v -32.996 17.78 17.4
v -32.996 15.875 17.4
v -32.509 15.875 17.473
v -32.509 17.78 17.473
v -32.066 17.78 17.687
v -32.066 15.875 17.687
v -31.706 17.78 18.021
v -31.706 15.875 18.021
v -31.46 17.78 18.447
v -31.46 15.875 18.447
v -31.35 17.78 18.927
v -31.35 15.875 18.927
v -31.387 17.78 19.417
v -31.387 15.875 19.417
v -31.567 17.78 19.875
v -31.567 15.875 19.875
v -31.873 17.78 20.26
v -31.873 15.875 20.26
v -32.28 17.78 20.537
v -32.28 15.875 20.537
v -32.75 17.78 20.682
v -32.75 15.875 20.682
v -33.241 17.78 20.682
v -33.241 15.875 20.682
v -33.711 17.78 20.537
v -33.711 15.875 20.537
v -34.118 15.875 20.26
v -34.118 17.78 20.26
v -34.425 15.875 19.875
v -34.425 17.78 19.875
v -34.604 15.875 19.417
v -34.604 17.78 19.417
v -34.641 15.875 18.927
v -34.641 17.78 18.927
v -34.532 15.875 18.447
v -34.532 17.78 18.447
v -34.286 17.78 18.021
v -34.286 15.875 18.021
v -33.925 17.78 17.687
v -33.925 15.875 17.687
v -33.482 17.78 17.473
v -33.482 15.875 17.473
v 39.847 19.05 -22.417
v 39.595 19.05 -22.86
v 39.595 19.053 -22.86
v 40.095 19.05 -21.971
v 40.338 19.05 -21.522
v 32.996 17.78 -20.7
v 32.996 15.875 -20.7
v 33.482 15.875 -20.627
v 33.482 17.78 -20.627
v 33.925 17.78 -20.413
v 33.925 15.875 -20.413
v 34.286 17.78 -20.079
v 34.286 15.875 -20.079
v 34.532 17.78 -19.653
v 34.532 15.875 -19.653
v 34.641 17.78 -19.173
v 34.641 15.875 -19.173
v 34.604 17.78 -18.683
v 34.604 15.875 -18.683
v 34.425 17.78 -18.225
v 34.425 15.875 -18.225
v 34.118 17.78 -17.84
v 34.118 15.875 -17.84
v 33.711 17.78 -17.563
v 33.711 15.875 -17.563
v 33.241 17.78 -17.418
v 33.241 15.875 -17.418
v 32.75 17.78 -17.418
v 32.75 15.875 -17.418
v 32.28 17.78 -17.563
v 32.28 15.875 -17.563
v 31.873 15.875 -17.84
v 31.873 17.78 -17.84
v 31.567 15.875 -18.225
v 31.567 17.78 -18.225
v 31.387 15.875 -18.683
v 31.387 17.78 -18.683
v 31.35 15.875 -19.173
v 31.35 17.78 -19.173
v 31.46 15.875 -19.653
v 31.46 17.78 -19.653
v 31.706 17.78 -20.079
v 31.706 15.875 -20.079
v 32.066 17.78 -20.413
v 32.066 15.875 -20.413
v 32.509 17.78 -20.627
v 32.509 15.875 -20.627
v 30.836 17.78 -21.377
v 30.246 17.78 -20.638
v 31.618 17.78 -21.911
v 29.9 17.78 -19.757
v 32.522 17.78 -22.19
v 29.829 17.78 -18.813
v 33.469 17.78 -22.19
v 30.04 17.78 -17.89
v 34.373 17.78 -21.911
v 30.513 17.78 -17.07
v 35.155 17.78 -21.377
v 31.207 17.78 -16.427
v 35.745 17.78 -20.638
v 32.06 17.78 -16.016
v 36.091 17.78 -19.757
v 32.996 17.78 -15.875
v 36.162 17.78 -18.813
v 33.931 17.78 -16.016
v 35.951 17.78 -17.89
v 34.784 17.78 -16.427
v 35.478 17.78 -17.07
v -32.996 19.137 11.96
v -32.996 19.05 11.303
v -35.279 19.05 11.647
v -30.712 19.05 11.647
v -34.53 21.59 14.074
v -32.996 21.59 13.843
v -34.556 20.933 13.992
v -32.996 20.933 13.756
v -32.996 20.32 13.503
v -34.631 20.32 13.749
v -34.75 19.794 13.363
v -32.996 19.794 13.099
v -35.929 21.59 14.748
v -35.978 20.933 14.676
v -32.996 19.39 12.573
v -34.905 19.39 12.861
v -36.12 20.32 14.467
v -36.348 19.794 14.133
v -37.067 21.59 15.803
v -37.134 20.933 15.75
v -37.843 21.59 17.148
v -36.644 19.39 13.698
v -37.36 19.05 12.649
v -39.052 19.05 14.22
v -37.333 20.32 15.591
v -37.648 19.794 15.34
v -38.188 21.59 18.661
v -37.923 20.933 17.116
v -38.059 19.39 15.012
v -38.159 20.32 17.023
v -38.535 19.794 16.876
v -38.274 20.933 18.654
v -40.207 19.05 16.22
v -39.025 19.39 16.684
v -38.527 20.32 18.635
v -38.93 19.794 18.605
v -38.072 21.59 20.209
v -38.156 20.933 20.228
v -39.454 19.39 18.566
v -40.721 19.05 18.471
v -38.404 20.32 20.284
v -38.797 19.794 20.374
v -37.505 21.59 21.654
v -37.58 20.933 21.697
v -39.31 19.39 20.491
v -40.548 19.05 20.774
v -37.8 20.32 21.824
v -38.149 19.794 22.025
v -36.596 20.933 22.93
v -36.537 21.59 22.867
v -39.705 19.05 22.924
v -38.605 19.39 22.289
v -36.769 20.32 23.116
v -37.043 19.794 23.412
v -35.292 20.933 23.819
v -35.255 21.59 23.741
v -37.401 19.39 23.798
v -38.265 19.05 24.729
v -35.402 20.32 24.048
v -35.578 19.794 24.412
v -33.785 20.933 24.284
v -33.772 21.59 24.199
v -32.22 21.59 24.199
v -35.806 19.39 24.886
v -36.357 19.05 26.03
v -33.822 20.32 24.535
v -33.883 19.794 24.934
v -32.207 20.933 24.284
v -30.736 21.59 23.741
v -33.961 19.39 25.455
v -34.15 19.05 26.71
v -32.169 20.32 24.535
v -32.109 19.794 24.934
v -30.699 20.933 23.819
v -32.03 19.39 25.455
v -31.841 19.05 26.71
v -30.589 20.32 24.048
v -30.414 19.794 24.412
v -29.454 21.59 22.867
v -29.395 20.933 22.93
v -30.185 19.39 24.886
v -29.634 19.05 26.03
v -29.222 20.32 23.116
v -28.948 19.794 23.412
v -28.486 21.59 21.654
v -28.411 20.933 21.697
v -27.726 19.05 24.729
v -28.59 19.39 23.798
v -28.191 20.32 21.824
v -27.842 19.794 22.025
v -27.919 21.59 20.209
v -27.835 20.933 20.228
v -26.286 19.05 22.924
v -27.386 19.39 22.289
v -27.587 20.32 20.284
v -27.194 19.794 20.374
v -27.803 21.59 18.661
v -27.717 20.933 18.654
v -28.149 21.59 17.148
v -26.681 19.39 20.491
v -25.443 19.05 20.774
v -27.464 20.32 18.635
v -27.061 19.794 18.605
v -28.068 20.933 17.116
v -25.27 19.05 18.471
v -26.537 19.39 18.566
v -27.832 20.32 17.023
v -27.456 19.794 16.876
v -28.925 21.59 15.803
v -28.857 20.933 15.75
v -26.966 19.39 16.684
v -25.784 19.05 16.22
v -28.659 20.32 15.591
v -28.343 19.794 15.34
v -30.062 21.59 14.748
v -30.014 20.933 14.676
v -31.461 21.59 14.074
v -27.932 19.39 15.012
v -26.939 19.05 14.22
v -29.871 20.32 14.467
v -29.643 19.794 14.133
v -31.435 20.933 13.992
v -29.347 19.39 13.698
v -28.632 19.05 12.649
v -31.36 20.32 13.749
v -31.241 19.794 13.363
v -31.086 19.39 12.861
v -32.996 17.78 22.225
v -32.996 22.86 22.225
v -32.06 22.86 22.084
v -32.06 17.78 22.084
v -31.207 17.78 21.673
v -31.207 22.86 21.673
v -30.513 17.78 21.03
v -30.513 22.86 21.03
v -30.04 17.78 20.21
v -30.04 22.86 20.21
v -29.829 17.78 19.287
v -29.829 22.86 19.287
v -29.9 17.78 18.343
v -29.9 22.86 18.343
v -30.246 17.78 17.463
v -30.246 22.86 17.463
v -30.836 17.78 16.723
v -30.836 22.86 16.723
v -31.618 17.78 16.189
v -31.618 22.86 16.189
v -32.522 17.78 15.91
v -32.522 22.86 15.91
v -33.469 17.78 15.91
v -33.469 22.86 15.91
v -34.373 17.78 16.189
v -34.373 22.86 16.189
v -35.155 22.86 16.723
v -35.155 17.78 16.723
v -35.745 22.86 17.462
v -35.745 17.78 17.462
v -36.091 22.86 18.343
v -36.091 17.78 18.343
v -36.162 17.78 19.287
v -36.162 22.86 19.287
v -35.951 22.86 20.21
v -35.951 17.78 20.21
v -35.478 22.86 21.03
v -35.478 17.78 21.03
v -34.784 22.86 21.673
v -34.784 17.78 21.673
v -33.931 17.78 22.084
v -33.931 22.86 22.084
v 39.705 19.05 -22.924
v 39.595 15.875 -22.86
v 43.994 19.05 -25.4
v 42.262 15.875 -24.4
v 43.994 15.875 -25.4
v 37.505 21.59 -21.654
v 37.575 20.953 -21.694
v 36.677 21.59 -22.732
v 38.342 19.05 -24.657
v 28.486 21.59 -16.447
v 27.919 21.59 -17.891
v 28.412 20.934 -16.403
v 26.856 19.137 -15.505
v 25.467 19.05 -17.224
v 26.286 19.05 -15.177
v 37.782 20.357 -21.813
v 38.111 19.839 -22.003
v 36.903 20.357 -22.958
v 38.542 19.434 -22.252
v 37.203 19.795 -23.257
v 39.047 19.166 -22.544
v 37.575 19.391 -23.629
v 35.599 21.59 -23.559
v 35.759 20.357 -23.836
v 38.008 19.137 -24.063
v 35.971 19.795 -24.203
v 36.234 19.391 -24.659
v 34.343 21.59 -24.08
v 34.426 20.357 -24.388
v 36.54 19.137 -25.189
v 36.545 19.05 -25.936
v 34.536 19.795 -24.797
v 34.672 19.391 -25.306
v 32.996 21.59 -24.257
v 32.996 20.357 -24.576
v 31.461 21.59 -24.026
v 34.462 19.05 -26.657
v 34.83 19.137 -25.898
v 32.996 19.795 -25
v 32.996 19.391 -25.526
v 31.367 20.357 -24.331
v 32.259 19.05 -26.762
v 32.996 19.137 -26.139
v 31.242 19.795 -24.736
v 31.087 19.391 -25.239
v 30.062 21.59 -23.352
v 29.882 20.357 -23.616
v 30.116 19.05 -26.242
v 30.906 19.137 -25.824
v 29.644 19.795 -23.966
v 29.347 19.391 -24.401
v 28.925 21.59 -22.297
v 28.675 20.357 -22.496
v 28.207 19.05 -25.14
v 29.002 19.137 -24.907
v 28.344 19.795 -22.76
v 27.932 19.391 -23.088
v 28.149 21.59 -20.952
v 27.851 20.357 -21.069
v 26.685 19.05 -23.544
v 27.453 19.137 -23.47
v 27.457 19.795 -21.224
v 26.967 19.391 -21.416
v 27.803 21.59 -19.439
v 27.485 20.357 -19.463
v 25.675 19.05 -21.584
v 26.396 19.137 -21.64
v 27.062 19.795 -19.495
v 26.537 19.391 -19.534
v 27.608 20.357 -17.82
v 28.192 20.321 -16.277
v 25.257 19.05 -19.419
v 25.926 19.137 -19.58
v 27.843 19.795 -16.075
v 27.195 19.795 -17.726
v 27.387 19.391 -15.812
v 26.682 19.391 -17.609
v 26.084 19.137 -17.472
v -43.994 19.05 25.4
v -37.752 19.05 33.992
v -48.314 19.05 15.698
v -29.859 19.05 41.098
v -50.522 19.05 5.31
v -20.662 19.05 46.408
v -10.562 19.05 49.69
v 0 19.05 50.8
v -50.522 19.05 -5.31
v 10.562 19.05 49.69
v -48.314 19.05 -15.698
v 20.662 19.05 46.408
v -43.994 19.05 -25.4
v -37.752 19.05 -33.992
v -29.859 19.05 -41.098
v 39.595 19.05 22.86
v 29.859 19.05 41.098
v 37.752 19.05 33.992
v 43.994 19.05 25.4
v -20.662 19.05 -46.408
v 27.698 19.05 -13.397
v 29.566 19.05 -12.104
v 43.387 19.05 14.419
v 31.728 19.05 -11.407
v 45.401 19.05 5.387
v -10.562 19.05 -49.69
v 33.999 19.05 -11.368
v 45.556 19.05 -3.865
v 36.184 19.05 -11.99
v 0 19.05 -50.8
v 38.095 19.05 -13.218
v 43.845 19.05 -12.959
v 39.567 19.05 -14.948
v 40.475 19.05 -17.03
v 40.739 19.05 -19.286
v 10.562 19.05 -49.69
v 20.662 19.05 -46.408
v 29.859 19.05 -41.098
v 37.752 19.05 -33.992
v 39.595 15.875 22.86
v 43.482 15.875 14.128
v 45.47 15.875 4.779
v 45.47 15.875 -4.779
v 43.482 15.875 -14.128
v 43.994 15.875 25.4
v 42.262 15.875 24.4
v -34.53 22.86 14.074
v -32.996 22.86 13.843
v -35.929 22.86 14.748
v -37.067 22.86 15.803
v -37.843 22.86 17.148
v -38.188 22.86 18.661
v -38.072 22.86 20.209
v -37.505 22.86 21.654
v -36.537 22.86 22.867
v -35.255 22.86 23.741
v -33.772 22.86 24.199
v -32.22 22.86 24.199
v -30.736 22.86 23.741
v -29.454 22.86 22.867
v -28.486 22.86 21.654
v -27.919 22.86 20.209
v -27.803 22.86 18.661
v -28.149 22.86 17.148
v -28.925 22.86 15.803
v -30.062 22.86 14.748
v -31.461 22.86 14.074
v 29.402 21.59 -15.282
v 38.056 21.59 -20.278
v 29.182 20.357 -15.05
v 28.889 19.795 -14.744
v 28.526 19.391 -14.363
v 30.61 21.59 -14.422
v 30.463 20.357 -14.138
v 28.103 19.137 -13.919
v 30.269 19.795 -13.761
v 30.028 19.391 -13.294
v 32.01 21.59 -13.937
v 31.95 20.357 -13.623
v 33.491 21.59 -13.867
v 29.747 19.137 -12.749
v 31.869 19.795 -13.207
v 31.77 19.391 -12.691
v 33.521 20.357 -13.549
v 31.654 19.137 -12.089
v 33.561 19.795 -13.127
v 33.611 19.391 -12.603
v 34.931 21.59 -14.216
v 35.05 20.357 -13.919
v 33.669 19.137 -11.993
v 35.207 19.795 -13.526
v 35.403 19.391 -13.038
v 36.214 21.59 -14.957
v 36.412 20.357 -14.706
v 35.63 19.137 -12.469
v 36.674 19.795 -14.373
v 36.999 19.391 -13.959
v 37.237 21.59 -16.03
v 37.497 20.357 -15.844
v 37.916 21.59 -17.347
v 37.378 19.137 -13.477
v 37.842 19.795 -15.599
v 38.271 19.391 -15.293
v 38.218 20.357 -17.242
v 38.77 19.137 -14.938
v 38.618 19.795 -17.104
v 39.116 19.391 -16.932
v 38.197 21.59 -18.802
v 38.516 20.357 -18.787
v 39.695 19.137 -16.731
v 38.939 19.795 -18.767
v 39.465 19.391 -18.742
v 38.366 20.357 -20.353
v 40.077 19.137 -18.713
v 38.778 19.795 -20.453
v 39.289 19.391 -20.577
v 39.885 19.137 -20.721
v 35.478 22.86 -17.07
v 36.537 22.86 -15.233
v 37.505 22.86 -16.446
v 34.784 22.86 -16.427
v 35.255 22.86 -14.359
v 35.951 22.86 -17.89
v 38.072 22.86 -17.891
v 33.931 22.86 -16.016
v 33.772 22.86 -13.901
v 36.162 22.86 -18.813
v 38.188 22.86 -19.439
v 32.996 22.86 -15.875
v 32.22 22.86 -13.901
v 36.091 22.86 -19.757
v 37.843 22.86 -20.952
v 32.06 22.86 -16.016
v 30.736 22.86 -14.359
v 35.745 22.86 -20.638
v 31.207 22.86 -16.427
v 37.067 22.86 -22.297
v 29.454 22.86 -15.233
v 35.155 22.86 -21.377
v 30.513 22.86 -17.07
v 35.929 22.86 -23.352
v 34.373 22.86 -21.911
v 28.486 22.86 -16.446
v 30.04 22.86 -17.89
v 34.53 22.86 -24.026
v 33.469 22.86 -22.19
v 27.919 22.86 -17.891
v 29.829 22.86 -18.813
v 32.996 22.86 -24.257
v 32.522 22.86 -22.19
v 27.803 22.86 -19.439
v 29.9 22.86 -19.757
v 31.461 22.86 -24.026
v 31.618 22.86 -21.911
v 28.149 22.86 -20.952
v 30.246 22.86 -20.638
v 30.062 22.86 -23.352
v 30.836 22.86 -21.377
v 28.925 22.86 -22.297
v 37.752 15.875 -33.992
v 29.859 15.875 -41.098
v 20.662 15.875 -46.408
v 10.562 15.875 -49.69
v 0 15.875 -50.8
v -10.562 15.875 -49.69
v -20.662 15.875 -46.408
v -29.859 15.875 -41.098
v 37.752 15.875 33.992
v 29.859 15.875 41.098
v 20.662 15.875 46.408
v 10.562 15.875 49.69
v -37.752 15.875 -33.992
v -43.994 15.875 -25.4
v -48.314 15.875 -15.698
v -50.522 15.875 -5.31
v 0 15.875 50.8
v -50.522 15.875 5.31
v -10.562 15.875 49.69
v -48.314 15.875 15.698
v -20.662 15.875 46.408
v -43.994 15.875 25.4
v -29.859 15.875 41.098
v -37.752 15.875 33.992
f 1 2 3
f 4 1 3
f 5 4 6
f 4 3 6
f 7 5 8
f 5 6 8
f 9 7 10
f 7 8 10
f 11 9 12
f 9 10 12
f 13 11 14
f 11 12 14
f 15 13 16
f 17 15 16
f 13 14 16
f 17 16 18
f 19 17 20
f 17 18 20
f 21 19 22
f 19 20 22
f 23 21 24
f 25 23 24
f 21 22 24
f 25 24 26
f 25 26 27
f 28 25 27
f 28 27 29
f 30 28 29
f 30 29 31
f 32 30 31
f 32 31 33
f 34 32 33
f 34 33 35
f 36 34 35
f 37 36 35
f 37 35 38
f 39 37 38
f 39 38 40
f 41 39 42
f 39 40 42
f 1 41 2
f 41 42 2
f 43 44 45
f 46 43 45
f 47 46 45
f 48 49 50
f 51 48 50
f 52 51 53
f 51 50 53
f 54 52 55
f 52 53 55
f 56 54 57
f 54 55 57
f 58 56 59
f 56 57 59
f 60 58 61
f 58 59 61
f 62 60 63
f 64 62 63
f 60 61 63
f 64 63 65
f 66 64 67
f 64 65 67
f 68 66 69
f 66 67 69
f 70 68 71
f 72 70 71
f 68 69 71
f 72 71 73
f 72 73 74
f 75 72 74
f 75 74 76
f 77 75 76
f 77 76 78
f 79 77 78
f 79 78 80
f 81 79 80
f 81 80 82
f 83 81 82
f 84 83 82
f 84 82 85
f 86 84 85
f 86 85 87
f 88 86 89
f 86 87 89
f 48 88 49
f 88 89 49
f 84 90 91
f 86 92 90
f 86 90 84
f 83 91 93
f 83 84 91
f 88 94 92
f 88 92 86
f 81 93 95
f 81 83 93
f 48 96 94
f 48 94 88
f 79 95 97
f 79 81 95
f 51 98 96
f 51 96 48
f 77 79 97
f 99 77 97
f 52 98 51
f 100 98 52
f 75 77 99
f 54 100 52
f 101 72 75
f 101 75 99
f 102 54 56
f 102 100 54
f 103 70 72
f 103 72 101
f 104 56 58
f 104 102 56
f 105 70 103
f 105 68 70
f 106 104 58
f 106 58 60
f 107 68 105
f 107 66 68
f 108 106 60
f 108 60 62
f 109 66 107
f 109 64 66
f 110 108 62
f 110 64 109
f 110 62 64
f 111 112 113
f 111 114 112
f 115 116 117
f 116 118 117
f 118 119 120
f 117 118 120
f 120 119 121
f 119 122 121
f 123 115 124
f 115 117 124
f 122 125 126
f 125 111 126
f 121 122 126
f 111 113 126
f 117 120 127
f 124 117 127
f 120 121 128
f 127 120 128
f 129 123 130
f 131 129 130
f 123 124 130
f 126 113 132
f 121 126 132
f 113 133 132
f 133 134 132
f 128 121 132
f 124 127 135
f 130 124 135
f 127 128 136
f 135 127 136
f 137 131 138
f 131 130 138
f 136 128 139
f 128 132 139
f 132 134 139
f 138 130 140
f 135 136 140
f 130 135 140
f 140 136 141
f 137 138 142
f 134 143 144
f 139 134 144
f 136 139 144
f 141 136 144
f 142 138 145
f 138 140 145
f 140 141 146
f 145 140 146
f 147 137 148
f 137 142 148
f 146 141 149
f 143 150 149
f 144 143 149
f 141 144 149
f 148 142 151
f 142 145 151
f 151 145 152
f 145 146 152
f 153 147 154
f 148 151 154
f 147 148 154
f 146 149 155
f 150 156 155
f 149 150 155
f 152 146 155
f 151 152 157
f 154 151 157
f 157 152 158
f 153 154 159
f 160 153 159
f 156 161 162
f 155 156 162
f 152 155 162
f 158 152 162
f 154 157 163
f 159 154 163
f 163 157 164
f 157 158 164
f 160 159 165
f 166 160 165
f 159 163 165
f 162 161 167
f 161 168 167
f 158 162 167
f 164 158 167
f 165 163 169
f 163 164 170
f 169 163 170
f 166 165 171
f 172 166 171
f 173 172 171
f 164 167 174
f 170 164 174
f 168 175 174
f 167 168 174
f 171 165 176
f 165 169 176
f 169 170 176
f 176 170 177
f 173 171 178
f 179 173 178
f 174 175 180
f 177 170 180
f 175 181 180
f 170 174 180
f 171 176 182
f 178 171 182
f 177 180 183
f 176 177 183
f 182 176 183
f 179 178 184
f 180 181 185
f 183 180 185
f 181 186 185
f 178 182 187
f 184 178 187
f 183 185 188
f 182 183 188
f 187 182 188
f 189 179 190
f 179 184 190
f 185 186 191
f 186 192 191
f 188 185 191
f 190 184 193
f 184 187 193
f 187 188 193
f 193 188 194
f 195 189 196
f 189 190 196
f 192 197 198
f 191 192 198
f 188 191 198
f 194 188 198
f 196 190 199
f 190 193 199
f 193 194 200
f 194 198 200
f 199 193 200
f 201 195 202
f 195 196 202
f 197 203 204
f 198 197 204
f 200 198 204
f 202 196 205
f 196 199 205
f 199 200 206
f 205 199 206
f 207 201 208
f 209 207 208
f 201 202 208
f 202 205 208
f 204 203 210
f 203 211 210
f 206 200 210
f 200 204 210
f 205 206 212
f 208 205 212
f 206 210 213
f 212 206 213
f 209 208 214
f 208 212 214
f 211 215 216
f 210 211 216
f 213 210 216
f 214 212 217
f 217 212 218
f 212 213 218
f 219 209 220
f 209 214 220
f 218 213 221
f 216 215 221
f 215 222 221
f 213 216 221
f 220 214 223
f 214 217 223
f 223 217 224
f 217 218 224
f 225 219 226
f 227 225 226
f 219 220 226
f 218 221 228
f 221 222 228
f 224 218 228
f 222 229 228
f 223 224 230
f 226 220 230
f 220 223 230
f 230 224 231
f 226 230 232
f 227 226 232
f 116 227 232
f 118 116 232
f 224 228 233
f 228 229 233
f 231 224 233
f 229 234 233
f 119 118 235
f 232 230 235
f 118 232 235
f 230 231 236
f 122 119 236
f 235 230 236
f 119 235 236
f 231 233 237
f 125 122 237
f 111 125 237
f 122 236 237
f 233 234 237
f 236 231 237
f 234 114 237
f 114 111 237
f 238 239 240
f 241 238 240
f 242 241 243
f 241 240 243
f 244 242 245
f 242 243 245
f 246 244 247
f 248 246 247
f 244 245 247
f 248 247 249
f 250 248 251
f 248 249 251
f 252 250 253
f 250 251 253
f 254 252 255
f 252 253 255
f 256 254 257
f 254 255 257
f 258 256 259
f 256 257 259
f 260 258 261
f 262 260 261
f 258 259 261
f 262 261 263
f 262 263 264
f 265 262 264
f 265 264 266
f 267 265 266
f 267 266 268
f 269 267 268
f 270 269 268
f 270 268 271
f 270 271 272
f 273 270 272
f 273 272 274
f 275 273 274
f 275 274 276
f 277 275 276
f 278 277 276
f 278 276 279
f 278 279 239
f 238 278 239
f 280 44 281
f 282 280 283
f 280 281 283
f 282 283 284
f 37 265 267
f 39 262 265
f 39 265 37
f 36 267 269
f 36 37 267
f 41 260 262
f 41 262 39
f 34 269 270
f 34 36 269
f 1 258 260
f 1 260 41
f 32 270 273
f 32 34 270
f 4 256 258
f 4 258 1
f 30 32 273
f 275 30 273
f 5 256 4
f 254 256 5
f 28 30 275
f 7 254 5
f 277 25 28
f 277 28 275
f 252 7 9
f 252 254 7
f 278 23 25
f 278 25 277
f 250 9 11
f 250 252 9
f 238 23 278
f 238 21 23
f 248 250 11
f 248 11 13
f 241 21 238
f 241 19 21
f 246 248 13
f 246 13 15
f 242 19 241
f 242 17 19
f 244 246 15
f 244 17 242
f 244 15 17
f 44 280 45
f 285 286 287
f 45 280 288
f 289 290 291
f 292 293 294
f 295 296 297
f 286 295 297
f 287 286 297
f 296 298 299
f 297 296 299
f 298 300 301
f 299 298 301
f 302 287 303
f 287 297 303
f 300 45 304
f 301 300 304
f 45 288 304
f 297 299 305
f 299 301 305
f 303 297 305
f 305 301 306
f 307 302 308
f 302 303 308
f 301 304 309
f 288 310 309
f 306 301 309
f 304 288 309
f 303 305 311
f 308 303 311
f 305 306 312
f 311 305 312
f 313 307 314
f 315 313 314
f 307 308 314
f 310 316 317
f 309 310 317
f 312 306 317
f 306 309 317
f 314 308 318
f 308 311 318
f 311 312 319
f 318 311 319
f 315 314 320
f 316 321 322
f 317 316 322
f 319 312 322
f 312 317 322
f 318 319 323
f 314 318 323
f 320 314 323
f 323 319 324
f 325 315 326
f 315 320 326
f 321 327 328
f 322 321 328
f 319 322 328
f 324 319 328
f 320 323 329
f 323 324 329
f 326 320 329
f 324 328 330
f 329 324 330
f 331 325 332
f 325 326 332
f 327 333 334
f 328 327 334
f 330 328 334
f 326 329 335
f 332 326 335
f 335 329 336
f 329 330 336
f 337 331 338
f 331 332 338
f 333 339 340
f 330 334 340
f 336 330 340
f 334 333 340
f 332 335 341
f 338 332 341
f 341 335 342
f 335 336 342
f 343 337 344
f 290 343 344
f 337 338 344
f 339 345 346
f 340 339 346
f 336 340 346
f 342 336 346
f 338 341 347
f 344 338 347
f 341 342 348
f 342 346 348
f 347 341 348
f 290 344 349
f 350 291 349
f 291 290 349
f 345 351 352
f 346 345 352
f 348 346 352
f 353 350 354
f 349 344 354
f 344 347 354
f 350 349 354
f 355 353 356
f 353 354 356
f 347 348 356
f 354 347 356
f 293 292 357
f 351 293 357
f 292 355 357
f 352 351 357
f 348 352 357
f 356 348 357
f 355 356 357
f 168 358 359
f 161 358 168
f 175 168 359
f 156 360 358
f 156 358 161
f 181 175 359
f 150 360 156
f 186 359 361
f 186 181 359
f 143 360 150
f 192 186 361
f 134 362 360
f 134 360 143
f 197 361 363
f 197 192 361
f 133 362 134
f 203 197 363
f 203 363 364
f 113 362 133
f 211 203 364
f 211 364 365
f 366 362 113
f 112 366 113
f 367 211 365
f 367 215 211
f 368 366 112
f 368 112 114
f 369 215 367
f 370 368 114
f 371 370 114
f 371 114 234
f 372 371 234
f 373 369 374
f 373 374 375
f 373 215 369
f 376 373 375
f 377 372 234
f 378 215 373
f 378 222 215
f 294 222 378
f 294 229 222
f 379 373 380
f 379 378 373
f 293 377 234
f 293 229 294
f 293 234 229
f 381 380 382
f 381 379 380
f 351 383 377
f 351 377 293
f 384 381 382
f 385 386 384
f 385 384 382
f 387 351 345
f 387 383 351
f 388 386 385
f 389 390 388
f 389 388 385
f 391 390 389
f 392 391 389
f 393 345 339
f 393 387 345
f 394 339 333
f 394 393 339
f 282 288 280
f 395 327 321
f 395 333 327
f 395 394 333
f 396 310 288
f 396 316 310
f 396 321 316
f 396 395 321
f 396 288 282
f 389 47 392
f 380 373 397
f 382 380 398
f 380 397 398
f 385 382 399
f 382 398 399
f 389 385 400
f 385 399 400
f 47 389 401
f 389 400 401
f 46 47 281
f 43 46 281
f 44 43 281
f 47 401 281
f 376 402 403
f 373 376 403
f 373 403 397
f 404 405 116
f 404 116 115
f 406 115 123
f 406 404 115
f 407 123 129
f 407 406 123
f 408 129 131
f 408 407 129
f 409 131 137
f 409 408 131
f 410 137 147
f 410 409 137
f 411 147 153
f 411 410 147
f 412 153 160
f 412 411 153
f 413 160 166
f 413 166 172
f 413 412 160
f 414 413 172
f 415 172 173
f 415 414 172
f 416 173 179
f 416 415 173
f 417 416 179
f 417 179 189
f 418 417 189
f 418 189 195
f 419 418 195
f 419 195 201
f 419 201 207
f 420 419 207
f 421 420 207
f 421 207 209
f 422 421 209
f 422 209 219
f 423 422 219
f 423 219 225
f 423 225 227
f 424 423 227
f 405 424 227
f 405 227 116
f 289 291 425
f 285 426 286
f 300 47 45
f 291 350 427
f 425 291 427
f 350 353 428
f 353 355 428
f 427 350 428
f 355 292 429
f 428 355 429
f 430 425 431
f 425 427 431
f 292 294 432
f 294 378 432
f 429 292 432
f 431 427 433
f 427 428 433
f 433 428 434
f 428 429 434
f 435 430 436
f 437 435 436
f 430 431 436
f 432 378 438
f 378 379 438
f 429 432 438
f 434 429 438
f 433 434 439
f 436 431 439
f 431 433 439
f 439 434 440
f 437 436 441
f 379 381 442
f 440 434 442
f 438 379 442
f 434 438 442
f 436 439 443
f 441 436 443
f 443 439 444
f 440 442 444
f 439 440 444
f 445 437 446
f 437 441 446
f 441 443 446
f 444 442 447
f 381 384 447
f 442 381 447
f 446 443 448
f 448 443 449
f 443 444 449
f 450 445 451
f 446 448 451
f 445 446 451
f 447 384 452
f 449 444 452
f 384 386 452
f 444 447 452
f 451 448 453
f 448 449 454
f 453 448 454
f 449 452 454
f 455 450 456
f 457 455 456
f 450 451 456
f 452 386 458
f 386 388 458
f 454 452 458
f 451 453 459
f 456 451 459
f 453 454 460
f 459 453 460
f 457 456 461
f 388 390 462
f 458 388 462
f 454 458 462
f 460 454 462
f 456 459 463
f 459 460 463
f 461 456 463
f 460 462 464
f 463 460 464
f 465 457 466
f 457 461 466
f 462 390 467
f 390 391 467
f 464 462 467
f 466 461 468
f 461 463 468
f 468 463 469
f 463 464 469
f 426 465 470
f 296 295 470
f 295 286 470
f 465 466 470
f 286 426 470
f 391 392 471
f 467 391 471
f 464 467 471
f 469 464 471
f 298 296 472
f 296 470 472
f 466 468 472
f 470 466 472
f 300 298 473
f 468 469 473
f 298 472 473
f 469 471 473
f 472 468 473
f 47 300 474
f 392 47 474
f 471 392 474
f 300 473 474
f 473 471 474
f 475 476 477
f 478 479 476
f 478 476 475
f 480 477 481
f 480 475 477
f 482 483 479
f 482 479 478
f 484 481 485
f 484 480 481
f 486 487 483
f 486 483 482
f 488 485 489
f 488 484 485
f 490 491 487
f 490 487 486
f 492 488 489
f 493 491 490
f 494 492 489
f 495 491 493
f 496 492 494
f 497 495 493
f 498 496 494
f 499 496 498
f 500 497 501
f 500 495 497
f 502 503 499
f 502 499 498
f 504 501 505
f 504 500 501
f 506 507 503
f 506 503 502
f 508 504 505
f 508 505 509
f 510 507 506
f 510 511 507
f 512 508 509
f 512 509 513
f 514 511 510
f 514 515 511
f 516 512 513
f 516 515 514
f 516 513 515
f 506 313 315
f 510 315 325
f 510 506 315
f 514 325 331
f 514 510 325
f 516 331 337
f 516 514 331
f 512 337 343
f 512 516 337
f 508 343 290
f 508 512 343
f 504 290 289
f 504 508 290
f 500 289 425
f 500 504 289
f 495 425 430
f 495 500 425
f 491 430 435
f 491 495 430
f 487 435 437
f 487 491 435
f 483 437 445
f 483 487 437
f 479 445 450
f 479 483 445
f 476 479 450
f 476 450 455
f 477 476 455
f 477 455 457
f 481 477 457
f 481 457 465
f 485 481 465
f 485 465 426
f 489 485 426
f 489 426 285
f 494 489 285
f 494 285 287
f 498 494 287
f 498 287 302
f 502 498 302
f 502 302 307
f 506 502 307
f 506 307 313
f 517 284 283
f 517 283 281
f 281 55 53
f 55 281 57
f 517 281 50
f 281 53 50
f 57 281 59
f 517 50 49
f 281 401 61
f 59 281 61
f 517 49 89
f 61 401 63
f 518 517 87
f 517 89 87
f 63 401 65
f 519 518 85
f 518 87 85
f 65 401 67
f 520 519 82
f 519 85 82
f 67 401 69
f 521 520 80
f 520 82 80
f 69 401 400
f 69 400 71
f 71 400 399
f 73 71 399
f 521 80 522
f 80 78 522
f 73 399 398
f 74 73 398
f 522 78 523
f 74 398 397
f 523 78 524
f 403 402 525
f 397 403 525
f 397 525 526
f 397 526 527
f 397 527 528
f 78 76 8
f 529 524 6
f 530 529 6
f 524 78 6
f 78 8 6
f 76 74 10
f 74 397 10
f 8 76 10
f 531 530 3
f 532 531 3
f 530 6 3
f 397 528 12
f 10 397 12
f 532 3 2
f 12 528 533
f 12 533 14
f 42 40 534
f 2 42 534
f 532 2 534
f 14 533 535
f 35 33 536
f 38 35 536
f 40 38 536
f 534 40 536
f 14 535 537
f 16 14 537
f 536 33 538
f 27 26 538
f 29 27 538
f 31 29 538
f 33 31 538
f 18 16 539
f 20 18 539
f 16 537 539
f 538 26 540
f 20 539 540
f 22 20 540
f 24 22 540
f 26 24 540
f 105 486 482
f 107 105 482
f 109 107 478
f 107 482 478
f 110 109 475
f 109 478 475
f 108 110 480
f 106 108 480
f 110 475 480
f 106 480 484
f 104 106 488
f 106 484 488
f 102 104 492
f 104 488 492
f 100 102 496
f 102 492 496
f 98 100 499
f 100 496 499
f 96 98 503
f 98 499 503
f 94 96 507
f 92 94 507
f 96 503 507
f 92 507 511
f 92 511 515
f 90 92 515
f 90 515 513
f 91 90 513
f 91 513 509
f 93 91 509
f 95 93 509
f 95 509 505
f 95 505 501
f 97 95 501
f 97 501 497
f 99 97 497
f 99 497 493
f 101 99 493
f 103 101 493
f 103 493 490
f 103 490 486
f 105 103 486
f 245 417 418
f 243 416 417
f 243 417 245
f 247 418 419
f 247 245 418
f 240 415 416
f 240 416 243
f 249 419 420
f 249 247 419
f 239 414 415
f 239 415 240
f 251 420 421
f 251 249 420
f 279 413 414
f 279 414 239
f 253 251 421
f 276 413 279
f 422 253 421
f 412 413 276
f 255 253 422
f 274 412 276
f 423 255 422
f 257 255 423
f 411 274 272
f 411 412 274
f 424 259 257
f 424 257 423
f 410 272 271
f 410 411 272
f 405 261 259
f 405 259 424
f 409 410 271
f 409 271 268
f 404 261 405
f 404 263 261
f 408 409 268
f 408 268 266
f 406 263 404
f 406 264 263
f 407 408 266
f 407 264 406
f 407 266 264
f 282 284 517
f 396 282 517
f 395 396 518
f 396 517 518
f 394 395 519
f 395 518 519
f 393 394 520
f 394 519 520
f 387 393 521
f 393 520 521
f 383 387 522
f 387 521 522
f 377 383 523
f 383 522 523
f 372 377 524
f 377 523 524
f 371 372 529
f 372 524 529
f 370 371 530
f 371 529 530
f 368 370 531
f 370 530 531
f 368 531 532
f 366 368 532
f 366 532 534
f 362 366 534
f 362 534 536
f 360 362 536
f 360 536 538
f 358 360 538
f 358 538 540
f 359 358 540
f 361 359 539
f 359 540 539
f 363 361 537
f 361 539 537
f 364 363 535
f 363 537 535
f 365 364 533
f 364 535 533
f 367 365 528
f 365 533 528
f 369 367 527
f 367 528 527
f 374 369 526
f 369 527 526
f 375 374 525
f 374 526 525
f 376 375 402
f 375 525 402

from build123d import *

# Parameters (mm, degrees)
SKETCH1_R            = 50.8
SKETCH1_R_2          = 48.8
SKETCH1_R_3          = 1.905
BOSS_EXTRUDE1_DEPTH  = 3.175
SKETCH3_R            = 50.8
SKETCH3_R_2          = 48.8
BOSS_EXTRUDE3_DEPTH  = 12.7
CUT_EXTRUDE1_DEPTH   = 73.955945611
FILLET2_R            = 6.35
SKETCH5_R            = 1.905
SKETCH5_W            = 16.479
SKETCH5_H            = 6
BOSS_EXTRUDE4_DEPTH  = 1
CUT_EXTRUDE2_DEPTH   = 74.575102096
BOSS_EXTRUDE5_DEPTH  = 12.7
SKETCH10_R           = 1.5
CUT_EXTRUDE4_DEPTH   = 73.95594575
BOSS_EXTRUDE7_START  = 12.7
SKETCH11_R           = 4.04
SKETCH11_R_2         = 1.5
BOSS_EXTRUDE7_DEPTH  = 12.7
BOSS_EXTRUDE8_START  = 38.1
BOSS_EXTRUDE8_DEPTH  = 38.1
FILLET4_R            = 3.175
BOSS_EXTRUDE9_DEPTH  = 15.24
SKETCH14_R           = 1.5
BOSS_EXTRUDE10_DEPTH = 3.175
CUT_EXTRUDE5_DEPTH   = 69.215
SKETCH16_R           = 3.175
CUT_EXTRUDE6_DEPTH   = 1.27
BOSS_EXTRUDE11_START = 3.81
SKETCH17_R           = 5.207
SKETCH17_R_2         = 3.175
BOSS_EXTRUDE11_DEPTH = 3.81
FILLET5_R            = 2.54
SKETCH18_R           = 1.65
CUT_EXTRUDE7_DEPTH   = 1.905


with BuildPart() as part:
    # Sketch1 → Boss-Extrude1 (new body)
    # profile 1 of 2: a face of its own
    with BuildSketch(Plane(origin=(0, 0, 0), x_dir=(1, 0, 0), z_dir=(0, 1, 0))):
        with Locations(Location((0, 0, 0), (0, 0, 270))):
            Circle(SKETCH1_R)
        Circle(SKETCH1_R_2, mode=Mode.SUBTRACT)
    # profile 2 of 2: a face of its own
    with BuildSketch(Plane(origin=(0, 0, 0), x_dir=(1, 0, 0), z_dir=(0, 1, 0))):
        Circle(SKETCH1_R_2)
        with Locations(Location((-13.1445, 33.02, 0), (0, 0, 270))):
            Circle(SKETCH1_R_3, mode=Mode.SUBTRACT)
        with Locations(Location((13.1445, 33.02, 0), (0, 0, 270))):
            Circle(SKETCH1_R_3, mode=Mode.SUBTRACT)
    extrude(amount=BOSS_EXTRUDE1_DEPTH)

    # Sketch3 → Boss-Extrude3 (add)
    with BuildSketch(Plane(origin=(0, 3.175, 0), x_dir=(1, 0, 0), z_dir=(0, 1, 0))):
        with Locations(Location((0, 0, 0), (0, 0, 270))):
            Circle(SKETCH3_R)
        with Locations(Location((0, 0, 0), (0, 0, 90))):
            Circle(SKETCH3_R_2, mode=Mode.SUBTRACT)
    extrude(amount=BOSS_EXTRUDE3_DEPTH)

    # Sketch4 → Cut-Extrude1 (cut, through all)
    with BuildSketch(Plane(origin=(0, 3.175, 0), x_dir=(1, 0, 0), z_dir=(0, 1, 0))):
        with BuildLine():
            Line((25.4, -38.01523905), (25.4, -20.834346642))
            add(Edge.make_bspline(
                [(-25.4, -20.834346642), (0, -32.254229315), (25.4, -20.834346642)],
                knots=[0, 0, 0, 1, 1, 1], degree=2))
            Line((-25.4, -20.834346642), (-25.4, -38.01523905))
            ThreePointArc((-25.4, -38.01523905), (0, -45.72), (25.4, -38.01523905))
        make_face()
    extrude(amount=-CUT_EXTRUDE1_DEPTH, mode=Mode.SUBTRACT)

    # Fillet2
    fillet2_edges = [part.edges().sort_by_distance(p)[0] for p in [
        (25.4, 1.5875, 20.834346642),
        (-25.4, 1.5875, 20.834346642),
        (-25.4, 1.5875, 38.01523905),
        (25.4, 1.5875, 38.01523905),
    ]]
    fillet(fillet2_edges, radius=FILLET2_R)

    # Sketch5 → Boss-Extrude4 (add)
    # profile 1 of 8: a face of its own
    with BuildSketch(Plane(origin=(0, 3.175, 0), x_dir=(1, 0, 0), z_dir=(0, 1, 0))):
        with BuildLine():
            Line((13.1445, 37.925), (-13.1445, 37.925))
            ThreePointArc((-13.1445, 37.925), (-9.676141238, 36.488358762), (-8.2395, 33.02))
            Line((-8.2395, 33.02), (-8.2395, 28.115))
            Line((-8.2395, 28.115), (8.2395, 28.115))
            Line((8.2395, 28.115), (8.2395, 33.02))
            ThreePointArc((8.2395, 33.02), (9.676141238, 36.488358762), (13.1445, 37.925))
        make_face()
    # profile 2 of 8: a face of its own
    with BuildSketch(Plane(origin=(0, 3.175, 0), x_dir=(1, 0, 0), z_dir=(0, 1, 0))):
        with BuildLine():
            ThreePointArc((-8.2395, 33.02), (-9.676141238, 36.488358762), (-13.1445, 37.925))
            ThreePointArc((-13.1445, 37.925), (-16.612858762, 36.488358762), (-18.0495, 33.02))
            ThreePointArc((-18.0495, 33.02), (-16.612858762, 29.551641238), (-13.1445, 28.115))
            ThreePointArc((-13.1445, 28.115), (-9.676141238, 29.551641238), (-8.2395, 33.02))
        make_face()
        with Locations(Location((-13.1445, 33.02, 0), (0, 0, 270))):
            Circle(SKETCH5_R, mode=Mode.SUBTRACT)
    # profile 3 of 8: a face of its own
    with BuildSketch(Plane(origin=(0, 3.175, 0), x_dir=(1, 0, 0), z_dir=(0, 1, 0))):
        with BuildLine():
            ThreePointArc((18.0495, 33.02), (16.612858762, 36.488358762), (13.1445, 37.925))
            ThreePointArc((13.1445, 37.925), (9.676141238, 36.488358762), (8.2395, 33.02))
            ThreePointArc((8.2395, 33.02), (9.676141238, 29.551641238), (13.1445, 28.115))
            ThreePointArc((13.1445, 28.115), (16.612858762, 29.551641238), (18.0495, 33.02))
        make_face()
        with Locations(Location((13.1445, 33.02, 0), (0, 0, 270))):
            Circle(SKETCH5_R, mode=Mode.SUBTRACT)
    # profile 4 of 8: a face of its own
    with BuildSketch(Plane(origin=(0, 3.175, 0), x_dir=(1, 0, 0), z_dir=(0, 1, 0))):
        with BuildLine():
            Line((-8.2395, 28.115), (-8.2395, 33.02))
            ThreePointArc((-8.2395, 33.02), (-9.676141238, 29.551641238), (-13.1445, 28.115))
            Line((-13.1445, 28.115), (-8.2395, 28.115))
        make_face()
    # profile 5 of 8: a face of its own
    with BuildSketch(Plane(origin=(0, 3.175, 0), x_dir=(1, 0, 0), z_dir=(0, 1, 0))):
        with BuildLine():
            ThreePointArc((-13.1445, 28.115), (-16.612858762, 29.551641238), (-18.0495, 33.02))
            Line((-18.0495, 33.02), (-18.0495, -23.729829016))
            add(Edge.make_bspline(
                [(-17.200482213, -23.925830908), (-17.339134534, -23.883616376), (-17.479112922, -23.845147844), (-17.620279441, -23.81048615), (-17.762494237, -23.779683986), (-17.905615595, -23.752786017), (-18.049499996, -23.729828993)],
                knots=[0, 0, 0, 0, 0, 0, 0, 0.074218898, 0.074218898, 0.074218898, 0.074218898, 0.074218898, 0.074218898, 0.074218898], degree=6))
            add(Edge.make_bspline(
                [(-17.200482213, -23.925830908), (-12.719991107, -25.289975642), (-8.2395, -25.943438167)],
                knots=[0.16140783, 0.16140783, 0.16140783, 0.337805118, 0.337805118, 0.337805118], degree=2))
            Line((-8.2395, -25.943438167), (-8.2395, -2.461719083))
            Line((-8.2395, -2.461719083), (-8.2395, 3.538280917))
            Line((-8.2395, 3.538280917), (-8.2395, 28.115))
            Line((-8.2395, 28.115), (-13.1445, 28.115))
        make_face()
    # profile 6 of 8: a face of its own
    with BuildSketch(Plane(origin=(0, 3.175, 0), x_dir=(1, 0, 0), z_dir=(0, 1, 0))):
        with BuildLine():
            Line((18.0495, -23.729829016), (18.0495, 33.02))
            ThreePointArc((18.0495, 33.02), (16.612858762, 29.551641238), (13.1445, 28.115))
            Line((13.1445, 28.115), (8.2395, 28.115))
            Line((8.2395, 28.115), (8.2395, 3.538280917))
            Line((8.2395, 3.538280917), (8.2395, -2.461719083))
            Line((8.2395, -2.461719083), (8.2395, -25.943438167))
            add(Edge.make_bspline(
                [(8.2395, -25.943438167), (12.719991107, -25.289975642), (17.200482213, -23.925830908)],
                knots=[0.662194882, 0.662194882, 0.662194882, 0.83859217, 0.83859217, 0.83859217], degree=2))
            add(Edge.make_bspline(
                [(18.049499996, -23.729828993), (17.905615595, -23.752786017), (17.762494237, -23.779683986), (17.620279441, -23.81048615), (17.479112922, -23.845147844), (17.339134534, -23.883616376), (17.200482213, -23.925830908)],
                knots=[0.925781102, 0.925781102, 0.925781102, 0.925781102, 0.925781102, 0.925781102, 0.925781102, 1, 1, 1, 1, 1, 1, 1], degree=6))
        make_face()
    # profile 7 of 8: a face of its own
    with BuildSketch(Plane(origin=(0, 3.175, 0), x_dir=(1, 0, 0), z_dir=(0, 1, 0))):
        with BuildLine():
            ThreePointArc((13.1445, 28.115), (9.676141238, 29.551641238), (8.2395, 33.02))
            Line((8.2395, 33.02), (8.2395, 28.115))
            Line((8.2395, 28.115), (13.1445, 28.115))
        make_face()
    # profile 8 of 8: a face of its own
    with BuildSketch(Plane(origin=(0, 3.175, 0), x_dir=(1, 0, 0), z_dir=(0, 1, 0))):
        with Locations((0, 0.538280917)):
            Rectangle(SKETCH5_W, SKETCH5_H)
    extrude(amount=BOSS_EXTRUDE4_DEPTH)

    # Sketch6 → Cut-Extrude2 (cut, through all)
    with BuildSketch(Plane(origin=(0, 15.875, 0), x_dir=(1, 0, 0), z_dir=(0, 1, 0))):
        with BuildLine():
            Line((42.262039705, 24.4), (39.594681461, 22.86))
            ThreePointArc((39.594681461, 22.86), (44.162128778, 11.833206742), (45.72, 0))
            Line((45.72, 0), (48.8, 0))
            ThreePointArc((48.8, 0), (47.137180323, 12.630369401), (42.262039705, 24.4))
        make_face()
        with BuildLine():
            ThreePointArc((45.72, 0), (44.162128778, -11.833206742), (39.594681461, -22.86))
            Line((39.594681461, -22.86), (42.262039705, -24.4))
            ThreePointArc((42.262039705, -24.4), (47.137180323, -12.630369401), (48.8, 0))
            Line((48.8, 0), (45.72, 0))
        make_face()
        with BuildLine():
            ThreePointArc((48.8, 0), (47.137180323, -12.630369401), (42.262039705, -24.4))
            Line((42.262039705, -24.4), (43.994090512, -25.4))
            ThreePointArc((43.994090512, -25.4), (49.069031975, -13.148007491), (50.8, 0))
            Line((50.8, 0), (48.8, 0))
        make_face()
        with BuildLine():
            Line((43.994090512, 25.4), (42.262039705, 24.4))
            ThreePointArc((42.262039705, 24.4), (47.137180323, 12.630369401), (48.8, 0))
            Line((48.8, 0), (50.8, 0))
            ThreePointArc((50.8, 0), (49.069031975, 13.148007491), (43.994090512, 25.4))
        make_face()
    extrude(amount=-CUT_EXTRUDE2_DEPTH, mode=Mode.SUBTRACT)

    # Sketch7 → Boss-Extrude5 (add)
    with BuildSketch(Plane(origin=(0, 3.175, 0), x_dir=(1, 0, 0), z_dir=(0, 1, 0))):
        with BuildLine():
            Line((42.262039705, -24.4), (39.594681461, -22.86))
            ThreePointArc((39.594681461, -22.86), (45.72, 0), (39.594681461, 22.86))
            Line((39.594681461, 22.86), (42.262039705, 24.4))
            ThreePointArc((42.262039705, 24.4), (41.753056776, 25.261081723), (41.226531944, 26.111550392))
            Line((41.226531944, 26.111550392), (36.822993007, 23.569166002))
            ThreePointArc((36.822993007, 23.569166002), (43.72, 0), (36.822993007, -23.569166002))
            Line((36.822993007, -23.569166002), (41.226531944, -26.111550392))
            ThreePointArc((41.226531944, -26.111550392), (41.753056776, -25.261081723), (42.262039705, -24.4))
        make_face()
    extrude(amount=BOSS_EXTRUDE5_DEPTH)

    # Sketch10 → Cut-Extrude4 (cut, through all)
    with BuildSketch(Plane(origin=(0, 3.175, 0), x_dir=(1, 0, 0), z_dir=(0, 1, 0))):
        with Locations(Location((-32.995567884, -19.05, 0), (0, 0, 270))):
            Circle(SKETCH10_R)
        with Locations(Location((32.995567884, 19.05, 0), (0, 0, 270))):
            Circle(SKETCH10_R)
    extrude(amount=-CUT_EXTRUDE4_DEPTH, mode=Mode.SUBTRACT)

    # Sketch11 → Boss-Extrude7 (add)
    # profile 1 of 3: a face of its own
    with BuildSketch(Plane(origin=(0, 3.175, 0), x_dir=(1, 0, 0), z_dir=(0, 1, 0)).offset(BOSS_EXTRUDE7_START)):
        with BuildLine():
            Line((37.125332322, 23.09), (32.995567884, 23.09))
            ThreePointArc((32.995567884, 23.09), (35.85227928, 21.906711396), (37.035567884, 19.05))
            ThreePointArc((37.035567884, 19.05), (35.85227928, 16.193288604), (32.995567884, 15.01))
            Line((32.995567884, 15.01), (41.062614383, 15.01))
            ThreePointArc((41.062614383, 15.01), (39.302167275, 19.151450272), (37.125332322, 23.09))
        make_face()
    # profile 2 of 3: a face of its own
    with BuildSketch(Plane(origin=(0, 3.175, 0), x_dir=(1, 0, 0), z_dir=(0, 1, 0)).offset(BOSS_EXTRUDE7_START)):
        with Locations((32.995567884, 19.05)):
            Circle(SKETCH11_R)
        with Locations(Location((32.995567884, 19.05, 0), (0, 0, 270))):
            Circle(SKETCH11_R_2, mode=Mode.SUBTRACT)
    # profile 3 of 3: a face of its own
    with BuildSketch(Plane(origin=(0, 3.175, 0), x_dir=(1, 0, 0), z_dir=(0, 1, 0)).offset(BOSS_EXTRUDE7_START)):
        with Locations(Location((-32.995567884, -19.05, 0), (0, 0, 270))):
            Circle(SKETCH11_R)
        with Locations(Location((-32.995567884, -19.05, 0), (0, 0, 270))):
            Circle(SKETCH11_R_2, mode=Mode.SUBTRACT)
    extrude(amount=-BOSS_EXTRUDE7_DEPTH)

    # Sketch12 → Boss-Extrude8 (add)
    with BuildSketch(Plane.XZ.offset(BOSS_EXTRUDE8_START)):
        with BuildLine():
            ThreePointArc((28.584071469, 41.995128982), (29.185832393, 29.185832393), (41.995128982, 28.584071469))
            ThreePointArc((41.995128982, 28.584071469), (35.921024484, 35.921024484), (28.584071469, 41.995128982))
        make_face()
        with BuildLine():
            ThreePointArc((28.584071469, -41.995128982), (35.921024484, -35.921024484), (41.995128982, -28.584071469))
            ThreePointArc((41.995128982, -28.584071469), (29.185832393, -29.185832393), (28.584071469, -41.995128982))
        make_face()
        with BuildLine():
            ThreePointArc((-41.995128982, 28.584071469), (-29.185832393, 29.185832393), (-28.584071469, 41.995128982))
            ThreePointArc((-28.584071469, 41.995128982), (-35.921024484, 35.921024484), (-41.995128982, 28.584071469))
        make_face()
        with BuildLine():
            ThreePointArc((-41.995128982, -28.584071469), (-35.921024484, -35.921024484), (-28.584071469, -41.995128982))
            ThreePointArc((-28.584071469, -41.995128982), (-29.185832393, -29.185832393), (-41.995128982, -28.584071469))
        make_face()
    extrude(amount=-BOSS_EXTRUDE8_DEPTH)

    # Fillet4
    fillet4_edges = [part.edges().sort_by_distance(p)[0] for p in [
        (41.995128982, -19.05, 28.584071469),
        (28.584071469, -19.05, 41.995128982),
        (28.584071469, -19.05, -41.995128982),
        (41.995128982, -19.05, -28.584071469),
        (-28.584071469, -19.05, 41.995128982),
        (-41.995128982, -19.05, 28.584071469),
        (-41.995128982, -19.05, -28.584071469),
        (-28.584071469, -19.05, -41.995128982),
    ]]
    fillet(fillet4_edges, radius=FILLET4_R)

    # Sketch13 → Boss-Extrude9 (add)
    with BuildSketch(Plane.XZ.offset(38.1)):
        Polygon((35.022998872, 35.022998872), (30.532870812, 39.513126933), (26.940768363, 35.921024484), (35.921024484, 26.940768363), (39.513126933, 30.532870812), align=None)
        Polygon((26.741716429, -35.72197255), (35.72197255, -26.741716429), (39.314074999, -30.333818878), (34.823946938, -34.823946938), (30.333818878, -39.314074999), align=None)
        Polygon((-35.921024484, -26.542664495), (-26.940768363, -35.522920616), (-30.532870812, -39.115023065), (-35.022998872, -34.624895004), (-39.513126933, -30.134766943), align=None)
        Polygon((-26.741716429, 36.120076418), (-35.72197255, 27.139820297), (-39.314074999, 30.731922746), (-34.823946938, 35.222050806), (-30.333818878, 39.712178867), align=None)
    extrude(amount=BOSS_EXTRUDE9_DEPTH)

    # Sketch14 → Boss-Extrude10 (add)
    # profile 1 of 2: a face of its own
    with BuildSketch(Plane(origin=(0, 15.875, 0), x_dir=(1, 0, 0), z_dir=(0, 1, 0))):
        with BuildLine():
            ThreePointArc((43.994090512, 25.4), (-50.8, 0), (43.994090512, -25.4))
            Line((43.994090512, -25.4), (39.594681461, -22.86))
            ThreePointArc((39.594681461, -22.86), (45.72, 0), (39.594681461, 22.86))
            Line((39.594681461, 22.86), (43.994090512, 25.4))
        make_face()
        with Locations(Location((32.995567884, 19.05, 0), (0, 0, 270))):
            Circle(SKETCH14_R, mode=Mode.SUBTRACT)
        with BuildLine():
            ThreePointArc((41.062614383, 15.01), (43.458370563, -4.775817), (36.822993007, -23.569166002))
            Line((36.822993007, -23.569166002), (41.226531944, -26.111550392))
            ThreePointArc((41.226531944, -26.111550392), (-48.8, 0), (41.226531944, 26.111550392))
            Line((41.226531944, 26.111550392), (36.822993007, 23.569166002))
            ThreePointArc((36.822993007, 23.569166002), (36.974938874, 23.330072766), (37.125332322, 23.09))
            Line((37.125332322, 23.09), (32.995567884, 23.09))
            ThreePointArc((32.995567884, 23.09), (28.955567884, 19.05), (32.995567884, 15.01))
            Line((32.995567884, 15.01), (41.062614383, 15.01))
        make_face(mode=Mode.SUBTRACT)
    # profile 2 of 2: a face of its own
    with BuildSketch(Plane(origin=(0, 15.875, 0), x_dir=(1, 0, 0), z_dir=(0, 1, 0))):
        with BuildLine():
            Line((36.822993007, -23.569166002), (41.226531944, -26.111550392))
            ThreePointArc((41.226531944, -26.111550392), (-48.8, 0), (41.226531944, 26.111550392))
            Line((41.226531944, 26.111550392), (36.822993007, 23.569166002))
            ThreePointArc((36.822993007, 23.569166002), (36.974938874, 23.330072766), (37.125332322, 23.09))
            Line((37.125332322, 23.09), (32.995567884, 23.09))
            ThreePointArc((32.995567884, 23.09), (28.955567884, 19.05), (32.995567884, 15.01))
            Line((32.995567884, 15.01), (41.062614383, 15.01))
            ThreePointArc((41.062614383, 15.01), (43.458370563, -4.775817), (36.822993007, -23.569166002))
        make_face()
        with Locations(Location((-32.995567884, -19.05, 0), (0, 0, 270))):
            Circle(SKETCH14_R, mode=Mode.SUBTRACT)
    extrude(amount=BOSS_EXTRUDE10_DEPTH)

    # Sketch15 → Cut-Extrude5 (cut)
    with BuildSketch(Plane.XZ.offset(53.34)):
        Polygon((-90.577857324, 69.263738682), (77.84239147, 62.337364813), (72.519121415, -67.102149145), (-95.901127379, -60.175775277), align=None)
    extrude(amount=-CUT_EXTRUDE5_DEPTH, mode=Mode.SUBTRACT)

    # Sketch16 → Cut-Extrude6 (cut)
    with BuildSketch(Plane(origin=(0, 19.05, 0), x_dir=(1, 0, 0), z_dir=(0, 1, 0))):
        with Locations(Location((-32.995567884, -19.05, 0), (0, 0, 270))):
            Circle(SKETCH16_R)
        with Locations(Location((32.995567884, 19.05, 0), (0, 0, 270))):
            Circle(SKETCH16_R)
    extrude(amount=-CUT_EXTRUDE6_DEPTH, mode=Mode.SUBTRACT)

    # Sketch17 → Boss-Extrude11 (add)
    # profile 1 of 2: a face of its own
    with BuildSketch(Plane(origin=(0, 19.05, 0), x_dir=(1, 0, 0), z_dir=(0, 1, 0)).offset(BOSS_EXTRUDE11_START)):
        with Locations(Location((-32.995567884, -19.05, 0), (0, 0, 90))):
            Circle(SKETCH17_R)
        with Locations(Location((-32.995567884, -19.05, 0), (0, 0, 270))):
            Circle(SKETCH17_R_2, mode=Mode.SUBTRACT)
    # profile 2 of 2: a face of its own
    with BuildSketch(Plane(origin=(0, 19.05, 0), x_dir=(1, 0, 0), z_dir=(0, 1, 0)).offset(BOSS_EXTRUDE11_START)):
        with Locations(Location((32.995567884, 19.05, 0), (0, 0, 90))):
            Circle(SKETCH17_R)
        with Locations(Location((32.995567884, 19.05, 0), (0, 0, 270))):
            Circle(SKETCH17_R_2, mode=Mode.SUBTRACT)
    extrude(amount=-BOSS_EXTRUDE11_DEPTH)

    # Fillet5
    # the kernel refuses this fillet: 2.54 mm, written as the material it adds along each edge
    with BuildSketch(Plane(origin=(-32.995567884, 19.05, 19.05), x_dir=(0, 0, -1), z_dir=(1, 0, 0))) as fillet5_piece_1:
        with BuildLine():
            CenterArc((5.207 + FILLET5_R, FILLET5_R), FILLET5_R, 180, 90)
            Line((5.207, FILLET5_R), (5.207, 0))
            Line((5.207, 0), (5.207 + FILLET5_R, 0))
        make_face()
    revolve(axis=Axis((-32.995567884, 19.05, 19.05), (0, 1, 0)))
    with BuildSketch(Plane(origin=(32.995567884, 19.05, -19.05), x_dir=(0, 0, -1), z_dir=(1, 0, 0))) as fillet5_piece_2_section:
        with BuildLine():
            CenterArc((5.207 + FILLET5_R, FILLET5_R), FILLET5_R, 180, 90)
            Line((5.207, FILLET5_R), (5.207, 0))
            Line((5.207, 0), (5.207 + FILLET5_R, 0))
        make_face()
    fillet5_piece_2 = revolve(axis=Axis((32.995567884, 19.05, -19.05), (0, 1, 0)), mode=Mode.PRIVATE)
    fillet5_piece_2 = split(fillet5_piece_2, bisect_by=Plane(origin=(30.427698254, 19.773240888, -17.567439778), z_dir=(-0.5000000000000018, 0, -0.8660254037844376)), keep=Keep.TOP, mode=Mode.PRIVATE)
    add(fillet5_piece_2)
    with BuildSketch(Plane(origin=(32.995567884, 19.05, -19.05), x_dir=(0, 0, -1), z_dir=(1, 0, 0))) as fillet5_piece_3_section:
        with BuildLine():
            CenterArc((5.207 + FILLET5_R, FILLET5_R), FILLET5_R, 180, 90)
            Line((5.207, FILLET5_R), (5.207, 0))
            Line((5.207, 0), (5.207 + FILLET5_R, 0))
        make_face()
    fillet5_piece_3 = revolve(axis=Axis((32.995567884, 19.05, -19.05), (0, 1, 0)), mode=Mode.PRIVATE)
    fillet5_piece_3 = fillet5_piece_3 & Plane(origin=(0, 19.77324089, 0), x_dir=(0.8660254037844378, 0, 0.5000000000000014), z_dir=(0, -1, 0)) * Cylinder(45.72, 31, mode=Mode.PRIVATE)
    add(fillet5_piece_3)

    # Sketch18 → Cut-Extrude7 (cut)
    with BuildSketch(Plane.XZ.offset(-15.875)):
        with Locations(Location((-32.995567884, 19.05, 0), (0, 0, 270))):
            Circle(SKETCH18_R)
        with Locations(Location((32.995567884, -19.05, 0), (0, 0, 270))):
            Circle(SKETCH18_R)
    extrude(amount=-CUT_EXTRUDE7_DEPTH, mode=Mode.SUBTRACT)


solid = part.part
